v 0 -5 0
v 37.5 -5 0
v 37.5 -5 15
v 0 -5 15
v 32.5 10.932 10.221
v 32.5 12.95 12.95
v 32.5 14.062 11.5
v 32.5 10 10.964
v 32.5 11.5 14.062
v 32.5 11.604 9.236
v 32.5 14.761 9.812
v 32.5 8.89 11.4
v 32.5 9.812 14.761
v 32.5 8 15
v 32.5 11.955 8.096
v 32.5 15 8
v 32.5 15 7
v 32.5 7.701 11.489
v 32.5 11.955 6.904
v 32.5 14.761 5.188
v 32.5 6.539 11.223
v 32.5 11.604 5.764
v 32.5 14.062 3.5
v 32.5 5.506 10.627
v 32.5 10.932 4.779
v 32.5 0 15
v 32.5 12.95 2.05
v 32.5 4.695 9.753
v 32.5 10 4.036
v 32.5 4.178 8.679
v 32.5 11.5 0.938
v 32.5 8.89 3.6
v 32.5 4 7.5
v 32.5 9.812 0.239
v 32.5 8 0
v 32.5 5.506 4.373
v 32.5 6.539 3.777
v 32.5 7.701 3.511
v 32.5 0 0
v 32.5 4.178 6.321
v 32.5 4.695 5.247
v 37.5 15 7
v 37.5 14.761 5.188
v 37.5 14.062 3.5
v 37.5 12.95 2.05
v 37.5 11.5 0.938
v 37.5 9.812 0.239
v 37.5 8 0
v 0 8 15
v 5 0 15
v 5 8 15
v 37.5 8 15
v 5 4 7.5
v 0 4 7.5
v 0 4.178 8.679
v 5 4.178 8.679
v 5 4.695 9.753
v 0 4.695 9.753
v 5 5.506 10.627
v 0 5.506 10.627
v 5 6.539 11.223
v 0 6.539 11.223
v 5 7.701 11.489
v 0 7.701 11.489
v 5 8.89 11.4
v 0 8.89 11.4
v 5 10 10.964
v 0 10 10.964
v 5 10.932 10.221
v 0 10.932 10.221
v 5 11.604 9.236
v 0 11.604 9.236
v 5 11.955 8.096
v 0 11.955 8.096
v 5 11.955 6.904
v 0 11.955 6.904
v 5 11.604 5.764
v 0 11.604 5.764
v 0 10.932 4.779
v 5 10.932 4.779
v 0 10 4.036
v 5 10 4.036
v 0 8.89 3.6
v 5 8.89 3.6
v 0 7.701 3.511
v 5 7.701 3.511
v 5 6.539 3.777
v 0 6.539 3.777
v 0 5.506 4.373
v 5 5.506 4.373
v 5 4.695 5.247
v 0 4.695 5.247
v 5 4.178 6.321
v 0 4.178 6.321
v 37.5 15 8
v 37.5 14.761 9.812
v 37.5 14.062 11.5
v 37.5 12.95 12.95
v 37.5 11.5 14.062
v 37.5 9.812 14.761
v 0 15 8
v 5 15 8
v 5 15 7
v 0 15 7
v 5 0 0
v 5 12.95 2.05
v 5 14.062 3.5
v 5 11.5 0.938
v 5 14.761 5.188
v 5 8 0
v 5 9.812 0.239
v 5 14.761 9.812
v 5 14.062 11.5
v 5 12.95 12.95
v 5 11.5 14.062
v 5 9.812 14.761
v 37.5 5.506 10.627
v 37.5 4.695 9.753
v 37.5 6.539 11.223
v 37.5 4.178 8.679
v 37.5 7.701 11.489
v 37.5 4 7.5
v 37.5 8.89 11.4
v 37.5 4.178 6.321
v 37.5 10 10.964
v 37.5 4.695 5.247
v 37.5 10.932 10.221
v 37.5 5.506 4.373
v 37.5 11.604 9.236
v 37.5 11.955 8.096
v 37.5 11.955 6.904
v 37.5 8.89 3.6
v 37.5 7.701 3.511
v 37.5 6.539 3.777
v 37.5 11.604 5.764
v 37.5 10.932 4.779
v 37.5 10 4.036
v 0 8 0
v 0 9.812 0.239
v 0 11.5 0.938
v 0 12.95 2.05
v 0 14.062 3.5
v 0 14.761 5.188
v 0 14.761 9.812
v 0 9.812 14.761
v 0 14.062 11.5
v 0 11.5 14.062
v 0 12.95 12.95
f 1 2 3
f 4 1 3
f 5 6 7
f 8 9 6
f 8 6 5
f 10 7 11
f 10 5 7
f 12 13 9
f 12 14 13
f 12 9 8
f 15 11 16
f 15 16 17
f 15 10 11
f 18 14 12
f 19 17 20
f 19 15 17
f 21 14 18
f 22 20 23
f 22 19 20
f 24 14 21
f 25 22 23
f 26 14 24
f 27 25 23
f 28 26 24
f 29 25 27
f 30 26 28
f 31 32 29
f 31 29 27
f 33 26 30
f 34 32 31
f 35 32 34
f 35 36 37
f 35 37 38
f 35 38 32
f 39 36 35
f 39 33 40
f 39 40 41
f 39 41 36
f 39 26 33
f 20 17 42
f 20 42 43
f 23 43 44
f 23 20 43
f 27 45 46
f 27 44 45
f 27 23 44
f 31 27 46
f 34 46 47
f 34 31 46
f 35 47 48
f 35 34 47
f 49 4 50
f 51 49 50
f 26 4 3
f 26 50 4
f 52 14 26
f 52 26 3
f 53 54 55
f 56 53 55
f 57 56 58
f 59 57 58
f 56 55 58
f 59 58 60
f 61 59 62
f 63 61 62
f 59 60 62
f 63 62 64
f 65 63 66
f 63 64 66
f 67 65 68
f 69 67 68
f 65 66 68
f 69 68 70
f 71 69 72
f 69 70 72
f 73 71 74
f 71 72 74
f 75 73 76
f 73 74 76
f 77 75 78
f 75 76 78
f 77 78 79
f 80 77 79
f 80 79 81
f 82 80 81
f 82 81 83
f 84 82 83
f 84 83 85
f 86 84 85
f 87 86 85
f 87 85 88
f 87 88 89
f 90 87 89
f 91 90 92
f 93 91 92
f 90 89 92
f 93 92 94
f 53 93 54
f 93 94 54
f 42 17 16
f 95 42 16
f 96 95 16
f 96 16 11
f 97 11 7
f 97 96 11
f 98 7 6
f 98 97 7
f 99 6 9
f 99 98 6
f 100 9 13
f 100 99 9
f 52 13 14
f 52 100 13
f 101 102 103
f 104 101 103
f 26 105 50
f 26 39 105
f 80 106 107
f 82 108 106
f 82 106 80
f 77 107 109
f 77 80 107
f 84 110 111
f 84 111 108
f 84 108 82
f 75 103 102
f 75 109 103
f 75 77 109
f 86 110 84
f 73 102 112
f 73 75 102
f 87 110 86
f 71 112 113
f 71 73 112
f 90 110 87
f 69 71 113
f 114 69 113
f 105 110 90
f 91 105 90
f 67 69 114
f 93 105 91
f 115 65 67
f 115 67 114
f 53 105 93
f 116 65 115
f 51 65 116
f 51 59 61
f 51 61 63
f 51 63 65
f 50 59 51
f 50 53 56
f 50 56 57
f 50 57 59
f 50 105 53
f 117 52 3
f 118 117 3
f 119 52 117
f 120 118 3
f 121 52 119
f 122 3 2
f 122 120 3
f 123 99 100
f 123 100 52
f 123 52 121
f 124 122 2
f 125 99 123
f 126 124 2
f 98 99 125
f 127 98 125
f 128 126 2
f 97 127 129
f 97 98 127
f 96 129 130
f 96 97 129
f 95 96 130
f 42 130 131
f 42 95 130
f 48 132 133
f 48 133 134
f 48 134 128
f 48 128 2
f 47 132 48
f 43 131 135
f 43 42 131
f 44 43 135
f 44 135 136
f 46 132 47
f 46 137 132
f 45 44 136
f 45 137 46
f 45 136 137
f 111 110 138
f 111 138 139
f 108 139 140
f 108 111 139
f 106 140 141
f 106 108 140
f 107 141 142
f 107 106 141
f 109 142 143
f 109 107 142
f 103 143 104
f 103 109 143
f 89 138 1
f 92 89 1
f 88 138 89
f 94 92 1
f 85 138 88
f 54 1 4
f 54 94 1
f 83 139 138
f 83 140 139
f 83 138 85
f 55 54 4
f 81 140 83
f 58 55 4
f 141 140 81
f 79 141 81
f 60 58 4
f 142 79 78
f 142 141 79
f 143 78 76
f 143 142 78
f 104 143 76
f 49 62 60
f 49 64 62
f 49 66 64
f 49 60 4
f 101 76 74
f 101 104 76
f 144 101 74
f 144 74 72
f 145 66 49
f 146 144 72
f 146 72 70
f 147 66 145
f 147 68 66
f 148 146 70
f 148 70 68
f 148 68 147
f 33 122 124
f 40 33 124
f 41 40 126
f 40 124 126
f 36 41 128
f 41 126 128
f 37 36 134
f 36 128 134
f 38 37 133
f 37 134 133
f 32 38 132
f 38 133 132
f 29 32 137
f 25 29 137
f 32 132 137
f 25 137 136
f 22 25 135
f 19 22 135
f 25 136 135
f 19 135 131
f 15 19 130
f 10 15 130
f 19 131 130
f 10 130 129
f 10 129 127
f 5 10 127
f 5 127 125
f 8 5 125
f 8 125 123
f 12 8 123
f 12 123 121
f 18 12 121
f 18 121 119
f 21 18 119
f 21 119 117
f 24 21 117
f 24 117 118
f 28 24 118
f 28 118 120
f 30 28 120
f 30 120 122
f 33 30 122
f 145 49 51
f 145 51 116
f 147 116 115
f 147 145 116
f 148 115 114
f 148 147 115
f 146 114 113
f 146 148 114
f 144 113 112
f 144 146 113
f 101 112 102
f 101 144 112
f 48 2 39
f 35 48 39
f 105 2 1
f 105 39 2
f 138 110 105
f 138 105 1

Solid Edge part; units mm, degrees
sketch "Sketch1" plane through (0, 0, 0) normal (0, -1, 0) x (1, 0, 0)
  line L0 (37.5, 0) -> (0, 0)
  line L1 (0, 0) -> (0, 15)
  line L2 (0, 15) -> (37.5, 15)
  line L3 (37.5, 15) -> (37.5, 0)
extrude "Protrusion1" add sketch "Sketch1" along normal blind 5
sketch "Sketch2" plane through (18.75, 0, 7.5) normal (0, 1, 0) x (-1, 0, 0)
  line L0 (13.75, -7.5) -> (13.75, 7.5)
  line L1 (13.75, 7.5) -> (18.75, 7.5)
  line L2 (18.75, 7.5) -> (18.75, -7.5)
  line L3 (18.75, -7.5) -> (13.75, -7.5)
extrude "ExtrudedProtrusion_3" add sketch "Sketch2" along normal blind 15
sketch "Sketch3" plane through (0, 5, 7.5) normal (-1, 0, 0) x (0, -1, 0)
  circle A0 centre (-3, 0) radius 4
extrude "Cutout1" cut sketch "Sketch3" against normal through all
fillet "Round1" radius 7 2 edges at (2.5, 15, 15) (2.5, 15, 0)
mirror "Mirror1" about plane through (18.75, 5, 7.5) normal (-1, 0, 0) of "ExtrudedProtrusion_3", "Cutout1"
fillet "Round2" radius 7 2 edges at (35, 15, 15) (35, 15, 0)
